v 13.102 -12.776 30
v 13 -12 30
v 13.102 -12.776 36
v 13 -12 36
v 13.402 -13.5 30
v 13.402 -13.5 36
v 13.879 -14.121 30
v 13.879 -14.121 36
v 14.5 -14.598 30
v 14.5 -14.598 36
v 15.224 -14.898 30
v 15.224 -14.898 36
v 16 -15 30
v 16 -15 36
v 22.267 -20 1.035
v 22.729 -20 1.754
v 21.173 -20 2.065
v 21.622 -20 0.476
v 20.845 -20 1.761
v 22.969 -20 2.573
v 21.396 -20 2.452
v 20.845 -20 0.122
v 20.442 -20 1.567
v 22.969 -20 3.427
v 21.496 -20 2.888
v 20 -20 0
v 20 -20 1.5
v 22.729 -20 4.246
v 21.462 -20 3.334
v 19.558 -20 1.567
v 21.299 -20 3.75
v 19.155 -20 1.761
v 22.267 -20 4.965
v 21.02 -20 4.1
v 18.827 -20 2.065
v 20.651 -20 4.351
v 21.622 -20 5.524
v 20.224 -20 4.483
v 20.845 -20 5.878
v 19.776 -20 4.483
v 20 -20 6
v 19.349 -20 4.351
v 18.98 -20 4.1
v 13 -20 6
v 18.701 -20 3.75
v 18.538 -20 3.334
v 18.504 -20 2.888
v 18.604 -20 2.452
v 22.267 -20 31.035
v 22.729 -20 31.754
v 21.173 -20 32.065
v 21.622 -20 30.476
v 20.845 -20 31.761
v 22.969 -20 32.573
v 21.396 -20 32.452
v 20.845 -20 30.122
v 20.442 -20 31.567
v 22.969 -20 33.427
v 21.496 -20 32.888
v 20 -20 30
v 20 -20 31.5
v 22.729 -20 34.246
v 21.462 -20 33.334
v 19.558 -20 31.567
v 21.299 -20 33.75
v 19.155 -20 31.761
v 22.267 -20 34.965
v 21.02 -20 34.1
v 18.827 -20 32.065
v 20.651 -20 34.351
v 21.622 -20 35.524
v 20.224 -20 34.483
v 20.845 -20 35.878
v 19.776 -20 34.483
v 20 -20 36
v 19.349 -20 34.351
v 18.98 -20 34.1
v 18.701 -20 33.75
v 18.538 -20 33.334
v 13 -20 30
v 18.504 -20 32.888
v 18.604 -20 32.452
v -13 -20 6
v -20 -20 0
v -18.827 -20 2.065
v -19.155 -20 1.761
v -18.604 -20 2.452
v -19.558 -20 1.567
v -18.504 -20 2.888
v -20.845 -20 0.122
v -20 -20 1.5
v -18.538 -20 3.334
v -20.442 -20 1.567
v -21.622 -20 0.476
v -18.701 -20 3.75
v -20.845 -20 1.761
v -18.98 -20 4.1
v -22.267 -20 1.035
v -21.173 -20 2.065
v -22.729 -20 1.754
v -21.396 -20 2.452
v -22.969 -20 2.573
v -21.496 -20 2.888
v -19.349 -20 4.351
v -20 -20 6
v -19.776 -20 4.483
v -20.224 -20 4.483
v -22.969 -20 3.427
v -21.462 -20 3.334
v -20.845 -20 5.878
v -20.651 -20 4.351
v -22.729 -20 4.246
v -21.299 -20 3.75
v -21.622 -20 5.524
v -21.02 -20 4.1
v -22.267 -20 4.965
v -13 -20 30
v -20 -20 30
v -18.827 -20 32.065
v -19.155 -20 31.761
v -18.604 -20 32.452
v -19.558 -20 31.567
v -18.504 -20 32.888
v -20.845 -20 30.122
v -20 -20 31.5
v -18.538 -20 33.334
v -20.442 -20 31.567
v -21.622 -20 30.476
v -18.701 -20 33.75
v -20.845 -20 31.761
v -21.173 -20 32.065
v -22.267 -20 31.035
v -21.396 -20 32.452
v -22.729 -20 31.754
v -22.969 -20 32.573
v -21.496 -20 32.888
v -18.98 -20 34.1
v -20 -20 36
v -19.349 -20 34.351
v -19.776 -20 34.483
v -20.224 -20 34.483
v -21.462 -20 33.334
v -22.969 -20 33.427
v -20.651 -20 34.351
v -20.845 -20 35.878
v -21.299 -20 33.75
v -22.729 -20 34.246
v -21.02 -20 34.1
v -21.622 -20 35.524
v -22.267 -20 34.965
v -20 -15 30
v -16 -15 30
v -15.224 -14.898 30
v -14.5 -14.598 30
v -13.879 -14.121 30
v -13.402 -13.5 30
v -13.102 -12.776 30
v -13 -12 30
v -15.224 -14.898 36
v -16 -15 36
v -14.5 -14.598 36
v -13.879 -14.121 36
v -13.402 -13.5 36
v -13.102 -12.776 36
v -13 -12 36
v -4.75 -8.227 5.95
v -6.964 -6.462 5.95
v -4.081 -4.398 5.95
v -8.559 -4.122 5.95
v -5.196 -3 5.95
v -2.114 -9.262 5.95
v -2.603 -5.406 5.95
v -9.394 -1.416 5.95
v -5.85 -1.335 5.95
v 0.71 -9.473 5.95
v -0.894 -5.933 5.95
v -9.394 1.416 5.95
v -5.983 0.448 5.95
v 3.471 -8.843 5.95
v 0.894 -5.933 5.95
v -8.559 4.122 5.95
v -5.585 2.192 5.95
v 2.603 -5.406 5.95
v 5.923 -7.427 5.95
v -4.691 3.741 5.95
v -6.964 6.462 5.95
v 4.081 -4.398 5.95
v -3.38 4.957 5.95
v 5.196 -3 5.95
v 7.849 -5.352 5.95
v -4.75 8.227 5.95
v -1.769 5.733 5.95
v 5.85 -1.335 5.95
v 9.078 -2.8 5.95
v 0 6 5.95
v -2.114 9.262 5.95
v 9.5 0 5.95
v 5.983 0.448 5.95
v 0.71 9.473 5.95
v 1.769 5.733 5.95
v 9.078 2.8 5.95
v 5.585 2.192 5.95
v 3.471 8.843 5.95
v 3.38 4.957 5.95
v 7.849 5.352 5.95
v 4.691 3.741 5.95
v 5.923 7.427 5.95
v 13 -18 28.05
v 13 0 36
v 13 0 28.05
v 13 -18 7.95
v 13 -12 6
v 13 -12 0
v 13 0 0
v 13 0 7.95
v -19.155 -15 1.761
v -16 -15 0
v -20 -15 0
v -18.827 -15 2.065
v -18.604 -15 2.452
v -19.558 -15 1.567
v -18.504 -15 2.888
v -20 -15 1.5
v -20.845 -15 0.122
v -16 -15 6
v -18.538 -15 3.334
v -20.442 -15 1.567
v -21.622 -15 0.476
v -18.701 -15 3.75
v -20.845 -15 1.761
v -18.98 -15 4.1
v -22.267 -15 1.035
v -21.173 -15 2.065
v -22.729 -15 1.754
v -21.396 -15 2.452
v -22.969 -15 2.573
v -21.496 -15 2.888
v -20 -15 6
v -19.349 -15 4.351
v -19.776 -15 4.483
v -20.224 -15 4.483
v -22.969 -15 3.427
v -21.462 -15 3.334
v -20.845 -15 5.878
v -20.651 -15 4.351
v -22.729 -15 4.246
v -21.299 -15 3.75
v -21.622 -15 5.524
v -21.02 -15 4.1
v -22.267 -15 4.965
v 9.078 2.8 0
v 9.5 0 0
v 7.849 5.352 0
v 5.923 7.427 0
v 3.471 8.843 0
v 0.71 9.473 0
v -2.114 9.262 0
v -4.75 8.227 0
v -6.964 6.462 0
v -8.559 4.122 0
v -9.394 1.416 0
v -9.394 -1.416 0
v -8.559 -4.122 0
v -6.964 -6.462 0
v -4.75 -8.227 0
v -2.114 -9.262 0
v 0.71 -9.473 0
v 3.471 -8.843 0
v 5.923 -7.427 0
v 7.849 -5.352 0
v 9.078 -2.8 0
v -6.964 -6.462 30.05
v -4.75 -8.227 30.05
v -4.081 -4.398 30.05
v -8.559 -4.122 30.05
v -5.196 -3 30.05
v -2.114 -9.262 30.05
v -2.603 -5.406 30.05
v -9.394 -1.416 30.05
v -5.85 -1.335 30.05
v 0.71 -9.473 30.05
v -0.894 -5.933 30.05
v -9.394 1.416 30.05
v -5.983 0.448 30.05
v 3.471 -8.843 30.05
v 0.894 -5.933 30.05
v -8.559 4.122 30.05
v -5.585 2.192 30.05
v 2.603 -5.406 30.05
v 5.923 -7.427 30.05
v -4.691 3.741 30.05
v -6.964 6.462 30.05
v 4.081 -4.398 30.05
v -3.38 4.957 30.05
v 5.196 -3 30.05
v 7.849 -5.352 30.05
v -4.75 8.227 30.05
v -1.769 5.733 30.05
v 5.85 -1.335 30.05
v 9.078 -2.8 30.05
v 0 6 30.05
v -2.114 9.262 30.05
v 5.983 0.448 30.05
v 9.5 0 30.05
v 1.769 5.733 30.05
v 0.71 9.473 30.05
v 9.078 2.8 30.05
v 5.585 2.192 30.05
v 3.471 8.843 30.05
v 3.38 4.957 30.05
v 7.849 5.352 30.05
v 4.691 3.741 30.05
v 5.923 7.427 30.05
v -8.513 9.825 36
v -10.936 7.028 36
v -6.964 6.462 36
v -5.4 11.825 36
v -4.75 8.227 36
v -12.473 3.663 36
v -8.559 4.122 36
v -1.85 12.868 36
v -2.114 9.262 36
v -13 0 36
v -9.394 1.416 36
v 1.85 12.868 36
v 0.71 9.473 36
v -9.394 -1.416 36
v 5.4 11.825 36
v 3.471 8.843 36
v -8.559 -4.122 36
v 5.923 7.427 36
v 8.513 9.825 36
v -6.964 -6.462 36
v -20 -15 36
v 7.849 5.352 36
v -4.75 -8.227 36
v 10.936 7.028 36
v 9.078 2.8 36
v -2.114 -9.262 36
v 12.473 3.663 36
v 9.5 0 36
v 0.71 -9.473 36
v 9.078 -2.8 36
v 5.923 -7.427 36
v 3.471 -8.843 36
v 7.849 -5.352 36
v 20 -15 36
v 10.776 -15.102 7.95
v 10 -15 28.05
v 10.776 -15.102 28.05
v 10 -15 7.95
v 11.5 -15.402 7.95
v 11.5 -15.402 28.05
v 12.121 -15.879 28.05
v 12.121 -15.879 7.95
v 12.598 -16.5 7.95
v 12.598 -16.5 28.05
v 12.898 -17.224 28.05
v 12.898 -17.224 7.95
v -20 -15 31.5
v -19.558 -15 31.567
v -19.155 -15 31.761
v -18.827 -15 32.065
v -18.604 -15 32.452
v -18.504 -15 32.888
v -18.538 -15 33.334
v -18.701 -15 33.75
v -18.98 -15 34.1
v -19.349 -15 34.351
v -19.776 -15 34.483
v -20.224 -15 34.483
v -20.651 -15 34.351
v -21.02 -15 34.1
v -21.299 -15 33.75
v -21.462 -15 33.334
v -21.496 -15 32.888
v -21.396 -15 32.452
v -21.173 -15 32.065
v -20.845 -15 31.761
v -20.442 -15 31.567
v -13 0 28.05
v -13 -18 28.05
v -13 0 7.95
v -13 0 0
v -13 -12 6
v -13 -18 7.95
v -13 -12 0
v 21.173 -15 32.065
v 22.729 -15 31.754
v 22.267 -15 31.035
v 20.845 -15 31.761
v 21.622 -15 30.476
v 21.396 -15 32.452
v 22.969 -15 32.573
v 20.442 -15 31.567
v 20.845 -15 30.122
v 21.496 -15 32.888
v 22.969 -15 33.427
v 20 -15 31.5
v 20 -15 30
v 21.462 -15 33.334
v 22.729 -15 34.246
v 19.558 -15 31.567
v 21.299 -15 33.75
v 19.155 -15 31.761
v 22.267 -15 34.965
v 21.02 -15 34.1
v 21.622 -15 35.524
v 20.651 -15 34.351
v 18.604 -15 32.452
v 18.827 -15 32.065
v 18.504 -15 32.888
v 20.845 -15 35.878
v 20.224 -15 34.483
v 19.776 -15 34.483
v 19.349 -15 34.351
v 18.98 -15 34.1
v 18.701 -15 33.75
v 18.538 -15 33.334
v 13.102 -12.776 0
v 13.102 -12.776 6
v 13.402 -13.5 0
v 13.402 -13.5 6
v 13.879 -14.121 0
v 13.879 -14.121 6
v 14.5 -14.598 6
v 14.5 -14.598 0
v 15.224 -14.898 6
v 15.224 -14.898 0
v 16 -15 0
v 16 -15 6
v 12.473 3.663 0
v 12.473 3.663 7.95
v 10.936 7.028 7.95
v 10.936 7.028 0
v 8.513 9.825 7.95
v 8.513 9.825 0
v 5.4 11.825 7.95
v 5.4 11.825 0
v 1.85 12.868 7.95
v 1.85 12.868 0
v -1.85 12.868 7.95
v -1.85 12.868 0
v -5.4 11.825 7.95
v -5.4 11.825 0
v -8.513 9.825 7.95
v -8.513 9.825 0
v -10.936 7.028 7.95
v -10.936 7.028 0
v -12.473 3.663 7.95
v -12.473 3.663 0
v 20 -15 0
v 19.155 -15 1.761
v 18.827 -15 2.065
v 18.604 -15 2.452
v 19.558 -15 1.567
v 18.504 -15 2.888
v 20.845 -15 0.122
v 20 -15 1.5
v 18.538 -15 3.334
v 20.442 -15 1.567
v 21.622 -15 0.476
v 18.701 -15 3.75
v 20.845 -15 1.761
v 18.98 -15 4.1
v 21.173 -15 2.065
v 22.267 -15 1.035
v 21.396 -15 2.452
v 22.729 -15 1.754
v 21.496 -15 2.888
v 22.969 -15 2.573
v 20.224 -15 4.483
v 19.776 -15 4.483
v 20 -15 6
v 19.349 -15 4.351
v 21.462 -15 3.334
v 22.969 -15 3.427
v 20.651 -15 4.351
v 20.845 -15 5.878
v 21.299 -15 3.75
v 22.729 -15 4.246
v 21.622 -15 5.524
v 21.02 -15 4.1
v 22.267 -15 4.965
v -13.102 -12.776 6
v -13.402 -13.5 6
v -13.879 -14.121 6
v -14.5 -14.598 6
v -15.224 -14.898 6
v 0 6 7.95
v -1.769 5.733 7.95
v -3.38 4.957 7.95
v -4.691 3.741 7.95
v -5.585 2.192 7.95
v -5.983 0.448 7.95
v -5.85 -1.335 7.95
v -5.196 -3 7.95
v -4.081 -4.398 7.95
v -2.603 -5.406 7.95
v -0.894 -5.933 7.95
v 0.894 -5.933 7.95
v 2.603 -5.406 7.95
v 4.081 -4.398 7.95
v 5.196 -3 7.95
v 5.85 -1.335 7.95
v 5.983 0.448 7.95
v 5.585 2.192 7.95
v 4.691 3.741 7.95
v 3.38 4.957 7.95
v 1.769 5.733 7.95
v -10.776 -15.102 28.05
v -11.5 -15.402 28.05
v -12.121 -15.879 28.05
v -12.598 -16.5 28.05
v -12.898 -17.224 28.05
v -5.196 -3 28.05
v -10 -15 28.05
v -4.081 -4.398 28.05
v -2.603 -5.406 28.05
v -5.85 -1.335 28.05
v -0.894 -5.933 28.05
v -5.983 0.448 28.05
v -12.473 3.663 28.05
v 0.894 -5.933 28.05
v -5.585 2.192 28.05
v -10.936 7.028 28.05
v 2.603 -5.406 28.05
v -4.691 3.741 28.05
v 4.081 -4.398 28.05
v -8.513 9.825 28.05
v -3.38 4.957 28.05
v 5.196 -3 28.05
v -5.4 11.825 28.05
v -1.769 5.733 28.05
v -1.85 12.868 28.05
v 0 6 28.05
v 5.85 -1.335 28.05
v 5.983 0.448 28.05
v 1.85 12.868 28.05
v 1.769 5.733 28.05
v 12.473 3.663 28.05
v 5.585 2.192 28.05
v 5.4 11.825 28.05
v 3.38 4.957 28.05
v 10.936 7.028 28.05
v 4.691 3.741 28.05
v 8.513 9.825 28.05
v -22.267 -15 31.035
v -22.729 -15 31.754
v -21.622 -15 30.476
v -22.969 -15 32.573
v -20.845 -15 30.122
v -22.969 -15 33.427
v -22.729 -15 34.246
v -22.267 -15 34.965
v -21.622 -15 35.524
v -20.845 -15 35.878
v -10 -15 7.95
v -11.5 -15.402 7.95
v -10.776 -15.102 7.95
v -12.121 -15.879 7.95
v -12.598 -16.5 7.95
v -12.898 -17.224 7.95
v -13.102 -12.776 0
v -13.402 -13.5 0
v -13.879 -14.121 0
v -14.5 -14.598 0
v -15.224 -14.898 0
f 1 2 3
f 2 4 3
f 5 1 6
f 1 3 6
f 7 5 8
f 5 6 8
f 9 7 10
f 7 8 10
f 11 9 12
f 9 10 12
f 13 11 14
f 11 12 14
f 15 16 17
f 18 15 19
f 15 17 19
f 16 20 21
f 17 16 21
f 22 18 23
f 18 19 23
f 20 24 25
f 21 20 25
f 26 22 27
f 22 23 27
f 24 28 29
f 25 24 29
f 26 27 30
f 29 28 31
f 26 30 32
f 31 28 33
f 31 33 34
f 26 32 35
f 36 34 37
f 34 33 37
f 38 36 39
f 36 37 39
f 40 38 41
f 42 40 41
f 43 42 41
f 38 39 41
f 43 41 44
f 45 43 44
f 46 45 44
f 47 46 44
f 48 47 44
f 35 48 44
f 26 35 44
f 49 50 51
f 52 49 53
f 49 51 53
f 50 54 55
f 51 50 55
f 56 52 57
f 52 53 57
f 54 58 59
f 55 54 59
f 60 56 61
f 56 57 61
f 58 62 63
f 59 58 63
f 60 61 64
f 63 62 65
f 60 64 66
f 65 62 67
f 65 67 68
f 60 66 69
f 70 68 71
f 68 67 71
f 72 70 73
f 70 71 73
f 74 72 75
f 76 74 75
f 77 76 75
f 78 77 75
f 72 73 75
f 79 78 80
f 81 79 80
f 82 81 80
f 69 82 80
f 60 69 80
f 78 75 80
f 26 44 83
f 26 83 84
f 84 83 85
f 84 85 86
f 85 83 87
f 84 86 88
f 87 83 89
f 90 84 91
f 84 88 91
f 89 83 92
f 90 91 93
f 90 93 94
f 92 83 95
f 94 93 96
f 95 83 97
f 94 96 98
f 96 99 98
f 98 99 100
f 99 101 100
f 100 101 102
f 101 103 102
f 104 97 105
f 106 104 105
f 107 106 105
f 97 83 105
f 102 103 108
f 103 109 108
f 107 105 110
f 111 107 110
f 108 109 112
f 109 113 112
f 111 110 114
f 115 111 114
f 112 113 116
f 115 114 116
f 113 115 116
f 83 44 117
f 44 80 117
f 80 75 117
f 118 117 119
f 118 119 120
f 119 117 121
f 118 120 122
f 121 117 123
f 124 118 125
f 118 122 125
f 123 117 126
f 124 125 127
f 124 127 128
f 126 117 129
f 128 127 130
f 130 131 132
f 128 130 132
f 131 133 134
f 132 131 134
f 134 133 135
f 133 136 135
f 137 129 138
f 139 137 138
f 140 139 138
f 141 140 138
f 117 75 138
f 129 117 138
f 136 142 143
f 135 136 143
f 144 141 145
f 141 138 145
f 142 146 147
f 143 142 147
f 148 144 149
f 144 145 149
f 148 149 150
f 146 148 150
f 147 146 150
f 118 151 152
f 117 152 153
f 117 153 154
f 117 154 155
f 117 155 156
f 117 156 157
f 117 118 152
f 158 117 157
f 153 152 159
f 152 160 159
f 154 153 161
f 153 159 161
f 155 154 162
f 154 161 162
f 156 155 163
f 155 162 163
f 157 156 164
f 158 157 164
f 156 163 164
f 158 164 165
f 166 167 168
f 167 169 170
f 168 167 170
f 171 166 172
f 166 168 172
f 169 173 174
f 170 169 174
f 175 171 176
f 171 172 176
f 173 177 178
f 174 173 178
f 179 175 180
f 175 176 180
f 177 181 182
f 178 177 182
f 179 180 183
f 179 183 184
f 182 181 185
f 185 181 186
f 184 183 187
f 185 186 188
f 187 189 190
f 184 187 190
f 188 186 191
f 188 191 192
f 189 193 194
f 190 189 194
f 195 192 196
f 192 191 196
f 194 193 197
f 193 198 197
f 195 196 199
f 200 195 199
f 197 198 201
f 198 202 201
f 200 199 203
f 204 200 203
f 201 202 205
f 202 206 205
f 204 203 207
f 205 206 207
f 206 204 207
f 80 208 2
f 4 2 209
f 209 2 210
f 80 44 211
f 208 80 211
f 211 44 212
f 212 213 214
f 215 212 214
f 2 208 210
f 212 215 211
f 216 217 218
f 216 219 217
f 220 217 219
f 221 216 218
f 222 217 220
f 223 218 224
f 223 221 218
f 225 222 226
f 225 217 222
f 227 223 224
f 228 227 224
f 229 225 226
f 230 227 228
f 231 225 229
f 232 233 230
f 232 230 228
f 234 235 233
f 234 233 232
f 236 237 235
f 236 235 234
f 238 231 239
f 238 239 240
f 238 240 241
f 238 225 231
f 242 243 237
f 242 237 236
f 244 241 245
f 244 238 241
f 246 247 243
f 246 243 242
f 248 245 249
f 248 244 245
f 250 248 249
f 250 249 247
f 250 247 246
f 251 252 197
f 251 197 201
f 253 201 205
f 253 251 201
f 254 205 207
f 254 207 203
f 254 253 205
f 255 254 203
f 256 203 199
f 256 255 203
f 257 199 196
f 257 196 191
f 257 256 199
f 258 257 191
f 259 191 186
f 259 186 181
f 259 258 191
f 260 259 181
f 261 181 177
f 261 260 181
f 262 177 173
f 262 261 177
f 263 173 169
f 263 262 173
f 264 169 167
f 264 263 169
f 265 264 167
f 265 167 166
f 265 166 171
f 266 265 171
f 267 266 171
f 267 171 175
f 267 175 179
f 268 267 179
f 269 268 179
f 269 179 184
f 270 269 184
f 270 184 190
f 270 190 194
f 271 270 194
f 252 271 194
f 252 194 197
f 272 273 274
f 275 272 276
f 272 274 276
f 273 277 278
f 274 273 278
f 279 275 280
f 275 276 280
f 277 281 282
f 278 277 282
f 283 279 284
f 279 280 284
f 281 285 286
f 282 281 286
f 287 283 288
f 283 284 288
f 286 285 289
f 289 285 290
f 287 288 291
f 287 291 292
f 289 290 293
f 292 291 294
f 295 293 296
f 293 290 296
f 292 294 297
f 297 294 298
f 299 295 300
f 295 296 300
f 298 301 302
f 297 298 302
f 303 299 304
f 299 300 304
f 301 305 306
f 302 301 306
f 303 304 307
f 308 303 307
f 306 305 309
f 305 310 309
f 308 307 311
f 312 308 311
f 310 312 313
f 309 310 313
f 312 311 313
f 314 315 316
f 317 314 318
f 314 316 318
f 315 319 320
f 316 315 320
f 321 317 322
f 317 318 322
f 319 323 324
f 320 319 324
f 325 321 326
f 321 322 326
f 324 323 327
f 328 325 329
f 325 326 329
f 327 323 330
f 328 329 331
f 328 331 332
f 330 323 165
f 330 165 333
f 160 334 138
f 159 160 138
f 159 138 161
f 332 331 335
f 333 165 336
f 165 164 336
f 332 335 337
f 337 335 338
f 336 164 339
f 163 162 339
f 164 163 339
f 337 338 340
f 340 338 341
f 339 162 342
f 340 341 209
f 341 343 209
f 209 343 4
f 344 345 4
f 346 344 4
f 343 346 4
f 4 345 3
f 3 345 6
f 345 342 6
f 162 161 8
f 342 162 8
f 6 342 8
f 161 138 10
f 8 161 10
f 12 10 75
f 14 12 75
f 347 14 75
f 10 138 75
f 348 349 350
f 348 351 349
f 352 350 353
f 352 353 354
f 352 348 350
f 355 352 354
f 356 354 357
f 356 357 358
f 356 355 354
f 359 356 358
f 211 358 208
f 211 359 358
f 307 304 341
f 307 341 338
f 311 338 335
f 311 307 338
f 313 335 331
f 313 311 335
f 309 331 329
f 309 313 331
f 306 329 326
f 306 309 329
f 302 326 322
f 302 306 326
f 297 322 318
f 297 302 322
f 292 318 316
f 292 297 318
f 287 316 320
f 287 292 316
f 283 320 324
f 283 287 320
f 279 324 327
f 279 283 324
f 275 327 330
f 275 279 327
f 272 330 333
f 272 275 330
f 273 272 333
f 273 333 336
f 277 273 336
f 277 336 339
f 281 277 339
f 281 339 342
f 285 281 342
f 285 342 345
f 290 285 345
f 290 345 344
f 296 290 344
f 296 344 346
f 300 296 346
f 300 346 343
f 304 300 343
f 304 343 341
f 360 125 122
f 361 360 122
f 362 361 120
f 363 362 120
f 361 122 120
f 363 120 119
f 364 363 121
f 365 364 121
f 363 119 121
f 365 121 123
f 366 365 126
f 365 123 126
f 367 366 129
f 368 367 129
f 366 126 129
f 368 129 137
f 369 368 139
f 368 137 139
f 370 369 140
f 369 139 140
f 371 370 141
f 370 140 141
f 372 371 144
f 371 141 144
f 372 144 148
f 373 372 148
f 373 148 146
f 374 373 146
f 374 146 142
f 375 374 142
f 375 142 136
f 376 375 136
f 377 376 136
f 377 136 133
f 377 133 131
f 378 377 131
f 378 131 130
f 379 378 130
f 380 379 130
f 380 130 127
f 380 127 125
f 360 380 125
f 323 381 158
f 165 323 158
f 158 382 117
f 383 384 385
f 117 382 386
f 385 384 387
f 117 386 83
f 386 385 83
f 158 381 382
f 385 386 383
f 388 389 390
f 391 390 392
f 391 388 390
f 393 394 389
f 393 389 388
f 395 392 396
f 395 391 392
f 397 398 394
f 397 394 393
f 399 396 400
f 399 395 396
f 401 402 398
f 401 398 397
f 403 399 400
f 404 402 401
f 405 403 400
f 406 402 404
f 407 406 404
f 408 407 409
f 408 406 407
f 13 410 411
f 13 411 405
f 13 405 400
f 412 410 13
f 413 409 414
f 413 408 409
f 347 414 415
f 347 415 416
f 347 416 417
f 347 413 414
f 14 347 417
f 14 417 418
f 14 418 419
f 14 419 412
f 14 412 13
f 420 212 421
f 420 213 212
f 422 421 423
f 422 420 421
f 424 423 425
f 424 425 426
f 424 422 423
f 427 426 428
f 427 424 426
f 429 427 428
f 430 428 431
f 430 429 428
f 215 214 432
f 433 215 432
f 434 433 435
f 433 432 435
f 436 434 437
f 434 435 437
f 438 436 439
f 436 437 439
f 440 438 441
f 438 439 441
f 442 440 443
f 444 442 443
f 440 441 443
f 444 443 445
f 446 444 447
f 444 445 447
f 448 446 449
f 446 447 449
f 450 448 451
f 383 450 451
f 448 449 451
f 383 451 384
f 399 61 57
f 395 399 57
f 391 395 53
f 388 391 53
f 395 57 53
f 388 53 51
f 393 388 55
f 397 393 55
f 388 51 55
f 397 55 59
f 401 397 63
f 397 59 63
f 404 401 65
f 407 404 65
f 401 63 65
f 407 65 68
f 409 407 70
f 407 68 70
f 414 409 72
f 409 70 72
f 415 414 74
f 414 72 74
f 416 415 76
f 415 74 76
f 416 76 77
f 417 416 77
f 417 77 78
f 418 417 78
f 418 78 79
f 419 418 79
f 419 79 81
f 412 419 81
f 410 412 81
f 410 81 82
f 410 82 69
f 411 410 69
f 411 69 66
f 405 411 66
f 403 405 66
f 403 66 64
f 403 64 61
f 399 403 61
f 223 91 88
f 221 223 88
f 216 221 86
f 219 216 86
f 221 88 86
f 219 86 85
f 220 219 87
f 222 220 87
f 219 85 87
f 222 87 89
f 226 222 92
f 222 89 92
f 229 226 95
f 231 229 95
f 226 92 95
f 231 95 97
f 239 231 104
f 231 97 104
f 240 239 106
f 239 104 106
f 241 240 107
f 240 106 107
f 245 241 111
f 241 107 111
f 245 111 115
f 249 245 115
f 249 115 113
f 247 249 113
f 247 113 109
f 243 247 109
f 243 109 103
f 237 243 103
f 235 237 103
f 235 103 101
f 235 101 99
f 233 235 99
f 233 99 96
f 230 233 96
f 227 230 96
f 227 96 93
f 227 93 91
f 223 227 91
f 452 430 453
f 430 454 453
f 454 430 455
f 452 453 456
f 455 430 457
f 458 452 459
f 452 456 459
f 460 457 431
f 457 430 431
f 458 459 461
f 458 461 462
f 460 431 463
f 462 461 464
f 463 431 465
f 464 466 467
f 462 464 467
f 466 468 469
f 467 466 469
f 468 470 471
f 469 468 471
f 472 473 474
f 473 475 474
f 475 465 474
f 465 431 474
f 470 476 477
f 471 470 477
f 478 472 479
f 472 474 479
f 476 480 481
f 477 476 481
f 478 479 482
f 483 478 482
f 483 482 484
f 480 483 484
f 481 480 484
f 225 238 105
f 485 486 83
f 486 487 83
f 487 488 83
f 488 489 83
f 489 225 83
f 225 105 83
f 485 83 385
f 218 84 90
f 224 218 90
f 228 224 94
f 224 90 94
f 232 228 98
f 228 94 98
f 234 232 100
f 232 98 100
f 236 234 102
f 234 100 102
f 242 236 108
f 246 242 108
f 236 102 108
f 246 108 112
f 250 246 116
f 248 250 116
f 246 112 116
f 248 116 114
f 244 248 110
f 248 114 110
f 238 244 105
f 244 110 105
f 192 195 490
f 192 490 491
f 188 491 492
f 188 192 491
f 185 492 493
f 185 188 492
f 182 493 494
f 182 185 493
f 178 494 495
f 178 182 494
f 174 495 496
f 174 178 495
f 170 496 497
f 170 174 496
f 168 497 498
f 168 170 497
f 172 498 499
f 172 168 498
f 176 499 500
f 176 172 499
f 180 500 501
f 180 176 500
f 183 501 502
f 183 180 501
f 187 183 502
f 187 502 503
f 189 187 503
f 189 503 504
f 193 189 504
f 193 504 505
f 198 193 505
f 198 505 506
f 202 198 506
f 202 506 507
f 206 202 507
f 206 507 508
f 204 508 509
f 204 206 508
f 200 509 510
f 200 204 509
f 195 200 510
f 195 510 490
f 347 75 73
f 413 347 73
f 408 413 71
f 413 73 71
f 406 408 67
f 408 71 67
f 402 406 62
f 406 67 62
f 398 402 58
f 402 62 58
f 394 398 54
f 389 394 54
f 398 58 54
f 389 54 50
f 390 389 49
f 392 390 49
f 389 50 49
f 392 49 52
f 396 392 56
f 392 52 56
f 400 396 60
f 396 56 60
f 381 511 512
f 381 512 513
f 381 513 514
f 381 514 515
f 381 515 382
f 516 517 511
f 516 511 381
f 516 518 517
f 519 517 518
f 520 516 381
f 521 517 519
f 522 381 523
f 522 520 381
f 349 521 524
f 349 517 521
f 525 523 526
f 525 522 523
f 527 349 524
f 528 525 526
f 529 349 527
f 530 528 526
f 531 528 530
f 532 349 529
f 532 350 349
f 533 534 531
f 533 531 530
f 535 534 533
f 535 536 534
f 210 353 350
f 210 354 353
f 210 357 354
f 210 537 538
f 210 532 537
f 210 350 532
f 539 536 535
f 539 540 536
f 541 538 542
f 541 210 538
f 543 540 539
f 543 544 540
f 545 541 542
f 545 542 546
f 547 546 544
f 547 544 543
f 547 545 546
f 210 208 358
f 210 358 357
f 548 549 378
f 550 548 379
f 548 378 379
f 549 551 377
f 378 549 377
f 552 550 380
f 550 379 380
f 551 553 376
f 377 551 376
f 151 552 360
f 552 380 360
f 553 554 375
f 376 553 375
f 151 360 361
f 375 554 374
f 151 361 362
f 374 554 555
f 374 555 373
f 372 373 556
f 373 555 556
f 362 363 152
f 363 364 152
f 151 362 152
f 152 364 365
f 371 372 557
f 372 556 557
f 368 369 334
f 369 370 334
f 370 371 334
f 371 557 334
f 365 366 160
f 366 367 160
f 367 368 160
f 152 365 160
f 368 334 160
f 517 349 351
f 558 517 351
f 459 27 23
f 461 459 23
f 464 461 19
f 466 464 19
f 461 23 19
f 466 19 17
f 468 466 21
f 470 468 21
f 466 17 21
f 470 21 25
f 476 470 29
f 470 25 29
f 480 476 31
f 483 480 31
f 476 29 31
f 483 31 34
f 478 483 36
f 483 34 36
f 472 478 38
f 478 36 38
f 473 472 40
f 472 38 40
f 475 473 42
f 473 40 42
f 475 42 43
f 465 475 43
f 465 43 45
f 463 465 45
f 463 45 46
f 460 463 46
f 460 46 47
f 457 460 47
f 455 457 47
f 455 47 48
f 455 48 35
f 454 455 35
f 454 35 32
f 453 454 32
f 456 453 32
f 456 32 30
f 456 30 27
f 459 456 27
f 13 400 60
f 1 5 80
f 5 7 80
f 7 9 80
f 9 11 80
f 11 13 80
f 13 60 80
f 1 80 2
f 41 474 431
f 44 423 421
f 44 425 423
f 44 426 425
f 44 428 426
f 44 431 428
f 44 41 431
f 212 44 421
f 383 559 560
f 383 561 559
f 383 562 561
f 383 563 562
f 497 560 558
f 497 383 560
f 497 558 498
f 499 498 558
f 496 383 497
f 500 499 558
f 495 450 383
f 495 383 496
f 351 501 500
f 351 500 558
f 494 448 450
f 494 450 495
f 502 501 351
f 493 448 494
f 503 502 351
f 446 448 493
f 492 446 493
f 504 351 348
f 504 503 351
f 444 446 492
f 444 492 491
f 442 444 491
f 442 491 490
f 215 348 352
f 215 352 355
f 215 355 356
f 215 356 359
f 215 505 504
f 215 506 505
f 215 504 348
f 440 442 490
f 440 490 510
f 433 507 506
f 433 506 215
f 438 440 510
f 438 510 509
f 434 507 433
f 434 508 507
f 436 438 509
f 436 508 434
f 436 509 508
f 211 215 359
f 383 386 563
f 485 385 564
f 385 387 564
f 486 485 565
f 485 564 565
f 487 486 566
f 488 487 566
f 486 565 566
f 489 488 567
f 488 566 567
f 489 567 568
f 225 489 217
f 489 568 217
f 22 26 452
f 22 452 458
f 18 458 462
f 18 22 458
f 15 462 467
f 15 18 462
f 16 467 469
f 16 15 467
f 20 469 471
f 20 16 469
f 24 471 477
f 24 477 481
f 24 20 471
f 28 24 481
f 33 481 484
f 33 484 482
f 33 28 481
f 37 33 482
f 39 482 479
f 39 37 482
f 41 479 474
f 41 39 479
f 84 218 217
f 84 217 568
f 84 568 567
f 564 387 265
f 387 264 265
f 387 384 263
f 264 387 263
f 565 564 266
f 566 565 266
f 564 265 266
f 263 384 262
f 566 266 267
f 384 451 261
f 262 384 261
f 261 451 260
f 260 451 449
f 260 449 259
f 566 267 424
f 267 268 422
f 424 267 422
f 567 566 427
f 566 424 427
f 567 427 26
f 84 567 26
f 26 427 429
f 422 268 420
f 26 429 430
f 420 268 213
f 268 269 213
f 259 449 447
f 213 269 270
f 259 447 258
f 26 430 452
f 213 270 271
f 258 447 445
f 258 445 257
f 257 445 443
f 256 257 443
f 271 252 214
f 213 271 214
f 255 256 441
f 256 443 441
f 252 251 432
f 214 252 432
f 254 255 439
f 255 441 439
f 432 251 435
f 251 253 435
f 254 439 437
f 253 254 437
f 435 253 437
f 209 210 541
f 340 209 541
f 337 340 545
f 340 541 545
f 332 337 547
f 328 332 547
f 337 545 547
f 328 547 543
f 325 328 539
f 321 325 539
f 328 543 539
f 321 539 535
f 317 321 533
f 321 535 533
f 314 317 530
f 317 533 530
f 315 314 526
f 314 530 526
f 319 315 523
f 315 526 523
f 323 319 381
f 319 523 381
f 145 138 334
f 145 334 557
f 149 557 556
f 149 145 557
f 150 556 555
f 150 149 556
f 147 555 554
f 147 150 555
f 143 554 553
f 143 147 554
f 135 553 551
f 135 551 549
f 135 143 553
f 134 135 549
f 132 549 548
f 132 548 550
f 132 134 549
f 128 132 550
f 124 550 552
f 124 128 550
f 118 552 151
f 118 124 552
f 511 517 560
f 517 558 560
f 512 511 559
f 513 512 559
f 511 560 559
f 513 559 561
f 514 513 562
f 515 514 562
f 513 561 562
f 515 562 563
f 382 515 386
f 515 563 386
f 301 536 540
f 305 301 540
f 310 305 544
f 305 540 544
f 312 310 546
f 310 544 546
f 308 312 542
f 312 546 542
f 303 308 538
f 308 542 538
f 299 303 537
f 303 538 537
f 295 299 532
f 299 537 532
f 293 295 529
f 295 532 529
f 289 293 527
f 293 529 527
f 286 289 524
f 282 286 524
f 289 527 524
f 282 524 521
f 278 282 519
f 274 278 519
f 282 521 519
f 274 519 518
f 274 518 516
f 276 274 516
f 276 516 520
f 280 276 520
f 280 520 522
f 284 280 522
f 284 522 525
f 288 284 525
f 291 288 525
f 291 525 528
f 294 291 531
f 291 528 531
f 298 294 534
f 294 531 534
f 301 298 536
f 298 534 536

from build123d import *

# Parameters (mm, degrees)
CROQUIS1_R              = 9.5
SALIENTE_EXTRUIR1_DEPTH = 36
CROQUIS2_W              = 20.1
CROQUIS2_H              = 28
CORTAR_EXTRUIR2_DEPTH   = 49.703182648
CROQUIS3_R              = 9.5
CROQUIS3_R_2            = 6
SALIENTE_EXTRUIR2_DEPTH = 2
SALIENTE_EXTRUIR3_START = -2
CROQUIS4_R              = 9.5
CROQUIS4_R_2            = 6
SALIENTE_EXTRUIR3_DEPTH = 2
SALIENTE_EXTRUIR4_DEPTH = 5
CROQUIS6_R              = 1.5
CORTAR_EXTRUIR3_DEPTH   = 54.981478305
REDONDEO1_R             = 3
REDONDEO2_R             = 3


with BuildPart() as part:
    # Croquis1 → Saliente-Extruir1 (new body)
    with BuildSketch(Plane.XY):
        with BuildLine():
            Line((-13, 0), (-13, -20))
            Line((-13, -20), (13, -20))
            Line((13, -20), (13, 0))
            ThreePointArc((13, 0), (0, 13), (-13, 0))
        make_face()
        Circle(CROQUIS1_R, mode=Mode.SUBTRACT)
    extrude(amount=SALIENTE_EXTRUIR1_DEPTH)

    # Croquis2 → Cortar-Extruir2 (cut, through all)
    with BuildSketch(Plane(origin=(13, 0, 0), x_dir=(0, 0, -1), z_dir=(1, 0, 0))):
        with Locations((-18, -1)):
            Rectangle(CROQUIS2_W, CROQUIS2_H)
    extrude(amount=-CORTAR_EXTRUIR2_DEPTH, mode=Mode.SUBTRACT)

    # Croquis3 → Saliente-Extruir2 (add)
    with BuildSketch(Plane(origin=(0, 0, 28.05), x_dir=(-1, 0, 0), z_dir=(0, 0, -1))):
        with Locations(Location((0, 0, 0), (0, 0, 90))):
            Circle(CROQUIS3_R)
        with Locations(Location((0, 0, 0), (0, 0, 90))):
            Circle(CROQUIS3_R_2, mode=Mode.SUBTRACT)
    extrude(amount=-SALIENTE_EXTRUIR2_DEPTH)

    # Croquis4 → Saliente-Extruir3 (add)
    with BuildSketch(Plane.XY.offset(7.95).offset(SALIENTE_EXTRUIR3_START)):
        Circle(CROQUIS4_R)
        with Locations(Location((0, 0, 0), (0, 0, 90))):
            Circle(CROQUIS4_R_2, mode=Mode.SUBTRACT)
    extrude(amount=SALIENTE_EXTRUIR3_DEPTH)

    # Croquis5 → Saliente-Extruir4 (add)
    with BuildSketch(Plane.XZ.offset(20)):
        with BuildLine():
            Line((13, 36), (20, 36))
            ThreePointArc((20, 36), (23, 33), (20, 30))
            Line((20, 30), (13, 30))
            Line((13, 30), (13, 36))
        make_face()
        with BuildLine():
            Line((13, 0), (20, 0))
            ThreePointArc((20, 0), (23, 3), (20, 6))
            Line((20, 6), (13, 6))
            Line((13, 6), (13, 0))
        make_face()
        with BuildLine():
            Line((-13, 0), (-20, 0))
            ThreePointArc((-20, 0), (-23, 3), (-20, 6))
            Line((-20, 6), (-13, 6))
            Line((-13, 6), (-13, 0))
        make_face()
        with BuildLine():
            Line((-13, 30), (-13, 36))
            Line((-13, 36), (-20, 36))
            ThreePointArc((-20, 36), (-23, 33), (-20, 30))
            Line((-20, 30), (-13, 30))
        make_face()
    extrude(amount=-SALIENTE_EXTRUIR4_DEPTH)

    # Croquis6 → Cortar-Extruir3 (cut, through all)
    with BuildSketch(Plane.XZ.offset(20)):
        with Locations(Location((-20, 33, 0), (0, 0, 270))):
            Circle(CROQUIS6_R)
        with Locations(Location((20, 33, 0), (0, 0, 270))):
            Circle(CROQUIS6_R)
        with Locations(Location((-20, 3, 0), (0, 0, 270))):
            Circle(CROQUIS6_R)
        with Locations(Location((20, 3, 0), (0, 0, 270))):
            Circle(CROQUIS6_R)
    extrude(amount=-CORTAR_EXTRUIR3_DEPTH, mode=Mode.SUBTRACT)

    # Redondeo1
    redondeo1_edges = [part.edges().sort_by_distance(p)[0] for p in [
        (-13, -15, 33),
        (-13, -15, 3),
        (13, -15, 3),
        (13, -15, 33),
    ]]
    fillet(redondeo1_edges, radius=REDONDEO1_R)

    # Redondeo2
    redondeo2_edges = [part.edges().sort_by_distance(p)[0] for p in [
        (-13, -15, 18),
        (13, -15, 18),
    ]]
    fillet(redondeo2_edges, radius=REDONDEO2_R)


solid = part.part
